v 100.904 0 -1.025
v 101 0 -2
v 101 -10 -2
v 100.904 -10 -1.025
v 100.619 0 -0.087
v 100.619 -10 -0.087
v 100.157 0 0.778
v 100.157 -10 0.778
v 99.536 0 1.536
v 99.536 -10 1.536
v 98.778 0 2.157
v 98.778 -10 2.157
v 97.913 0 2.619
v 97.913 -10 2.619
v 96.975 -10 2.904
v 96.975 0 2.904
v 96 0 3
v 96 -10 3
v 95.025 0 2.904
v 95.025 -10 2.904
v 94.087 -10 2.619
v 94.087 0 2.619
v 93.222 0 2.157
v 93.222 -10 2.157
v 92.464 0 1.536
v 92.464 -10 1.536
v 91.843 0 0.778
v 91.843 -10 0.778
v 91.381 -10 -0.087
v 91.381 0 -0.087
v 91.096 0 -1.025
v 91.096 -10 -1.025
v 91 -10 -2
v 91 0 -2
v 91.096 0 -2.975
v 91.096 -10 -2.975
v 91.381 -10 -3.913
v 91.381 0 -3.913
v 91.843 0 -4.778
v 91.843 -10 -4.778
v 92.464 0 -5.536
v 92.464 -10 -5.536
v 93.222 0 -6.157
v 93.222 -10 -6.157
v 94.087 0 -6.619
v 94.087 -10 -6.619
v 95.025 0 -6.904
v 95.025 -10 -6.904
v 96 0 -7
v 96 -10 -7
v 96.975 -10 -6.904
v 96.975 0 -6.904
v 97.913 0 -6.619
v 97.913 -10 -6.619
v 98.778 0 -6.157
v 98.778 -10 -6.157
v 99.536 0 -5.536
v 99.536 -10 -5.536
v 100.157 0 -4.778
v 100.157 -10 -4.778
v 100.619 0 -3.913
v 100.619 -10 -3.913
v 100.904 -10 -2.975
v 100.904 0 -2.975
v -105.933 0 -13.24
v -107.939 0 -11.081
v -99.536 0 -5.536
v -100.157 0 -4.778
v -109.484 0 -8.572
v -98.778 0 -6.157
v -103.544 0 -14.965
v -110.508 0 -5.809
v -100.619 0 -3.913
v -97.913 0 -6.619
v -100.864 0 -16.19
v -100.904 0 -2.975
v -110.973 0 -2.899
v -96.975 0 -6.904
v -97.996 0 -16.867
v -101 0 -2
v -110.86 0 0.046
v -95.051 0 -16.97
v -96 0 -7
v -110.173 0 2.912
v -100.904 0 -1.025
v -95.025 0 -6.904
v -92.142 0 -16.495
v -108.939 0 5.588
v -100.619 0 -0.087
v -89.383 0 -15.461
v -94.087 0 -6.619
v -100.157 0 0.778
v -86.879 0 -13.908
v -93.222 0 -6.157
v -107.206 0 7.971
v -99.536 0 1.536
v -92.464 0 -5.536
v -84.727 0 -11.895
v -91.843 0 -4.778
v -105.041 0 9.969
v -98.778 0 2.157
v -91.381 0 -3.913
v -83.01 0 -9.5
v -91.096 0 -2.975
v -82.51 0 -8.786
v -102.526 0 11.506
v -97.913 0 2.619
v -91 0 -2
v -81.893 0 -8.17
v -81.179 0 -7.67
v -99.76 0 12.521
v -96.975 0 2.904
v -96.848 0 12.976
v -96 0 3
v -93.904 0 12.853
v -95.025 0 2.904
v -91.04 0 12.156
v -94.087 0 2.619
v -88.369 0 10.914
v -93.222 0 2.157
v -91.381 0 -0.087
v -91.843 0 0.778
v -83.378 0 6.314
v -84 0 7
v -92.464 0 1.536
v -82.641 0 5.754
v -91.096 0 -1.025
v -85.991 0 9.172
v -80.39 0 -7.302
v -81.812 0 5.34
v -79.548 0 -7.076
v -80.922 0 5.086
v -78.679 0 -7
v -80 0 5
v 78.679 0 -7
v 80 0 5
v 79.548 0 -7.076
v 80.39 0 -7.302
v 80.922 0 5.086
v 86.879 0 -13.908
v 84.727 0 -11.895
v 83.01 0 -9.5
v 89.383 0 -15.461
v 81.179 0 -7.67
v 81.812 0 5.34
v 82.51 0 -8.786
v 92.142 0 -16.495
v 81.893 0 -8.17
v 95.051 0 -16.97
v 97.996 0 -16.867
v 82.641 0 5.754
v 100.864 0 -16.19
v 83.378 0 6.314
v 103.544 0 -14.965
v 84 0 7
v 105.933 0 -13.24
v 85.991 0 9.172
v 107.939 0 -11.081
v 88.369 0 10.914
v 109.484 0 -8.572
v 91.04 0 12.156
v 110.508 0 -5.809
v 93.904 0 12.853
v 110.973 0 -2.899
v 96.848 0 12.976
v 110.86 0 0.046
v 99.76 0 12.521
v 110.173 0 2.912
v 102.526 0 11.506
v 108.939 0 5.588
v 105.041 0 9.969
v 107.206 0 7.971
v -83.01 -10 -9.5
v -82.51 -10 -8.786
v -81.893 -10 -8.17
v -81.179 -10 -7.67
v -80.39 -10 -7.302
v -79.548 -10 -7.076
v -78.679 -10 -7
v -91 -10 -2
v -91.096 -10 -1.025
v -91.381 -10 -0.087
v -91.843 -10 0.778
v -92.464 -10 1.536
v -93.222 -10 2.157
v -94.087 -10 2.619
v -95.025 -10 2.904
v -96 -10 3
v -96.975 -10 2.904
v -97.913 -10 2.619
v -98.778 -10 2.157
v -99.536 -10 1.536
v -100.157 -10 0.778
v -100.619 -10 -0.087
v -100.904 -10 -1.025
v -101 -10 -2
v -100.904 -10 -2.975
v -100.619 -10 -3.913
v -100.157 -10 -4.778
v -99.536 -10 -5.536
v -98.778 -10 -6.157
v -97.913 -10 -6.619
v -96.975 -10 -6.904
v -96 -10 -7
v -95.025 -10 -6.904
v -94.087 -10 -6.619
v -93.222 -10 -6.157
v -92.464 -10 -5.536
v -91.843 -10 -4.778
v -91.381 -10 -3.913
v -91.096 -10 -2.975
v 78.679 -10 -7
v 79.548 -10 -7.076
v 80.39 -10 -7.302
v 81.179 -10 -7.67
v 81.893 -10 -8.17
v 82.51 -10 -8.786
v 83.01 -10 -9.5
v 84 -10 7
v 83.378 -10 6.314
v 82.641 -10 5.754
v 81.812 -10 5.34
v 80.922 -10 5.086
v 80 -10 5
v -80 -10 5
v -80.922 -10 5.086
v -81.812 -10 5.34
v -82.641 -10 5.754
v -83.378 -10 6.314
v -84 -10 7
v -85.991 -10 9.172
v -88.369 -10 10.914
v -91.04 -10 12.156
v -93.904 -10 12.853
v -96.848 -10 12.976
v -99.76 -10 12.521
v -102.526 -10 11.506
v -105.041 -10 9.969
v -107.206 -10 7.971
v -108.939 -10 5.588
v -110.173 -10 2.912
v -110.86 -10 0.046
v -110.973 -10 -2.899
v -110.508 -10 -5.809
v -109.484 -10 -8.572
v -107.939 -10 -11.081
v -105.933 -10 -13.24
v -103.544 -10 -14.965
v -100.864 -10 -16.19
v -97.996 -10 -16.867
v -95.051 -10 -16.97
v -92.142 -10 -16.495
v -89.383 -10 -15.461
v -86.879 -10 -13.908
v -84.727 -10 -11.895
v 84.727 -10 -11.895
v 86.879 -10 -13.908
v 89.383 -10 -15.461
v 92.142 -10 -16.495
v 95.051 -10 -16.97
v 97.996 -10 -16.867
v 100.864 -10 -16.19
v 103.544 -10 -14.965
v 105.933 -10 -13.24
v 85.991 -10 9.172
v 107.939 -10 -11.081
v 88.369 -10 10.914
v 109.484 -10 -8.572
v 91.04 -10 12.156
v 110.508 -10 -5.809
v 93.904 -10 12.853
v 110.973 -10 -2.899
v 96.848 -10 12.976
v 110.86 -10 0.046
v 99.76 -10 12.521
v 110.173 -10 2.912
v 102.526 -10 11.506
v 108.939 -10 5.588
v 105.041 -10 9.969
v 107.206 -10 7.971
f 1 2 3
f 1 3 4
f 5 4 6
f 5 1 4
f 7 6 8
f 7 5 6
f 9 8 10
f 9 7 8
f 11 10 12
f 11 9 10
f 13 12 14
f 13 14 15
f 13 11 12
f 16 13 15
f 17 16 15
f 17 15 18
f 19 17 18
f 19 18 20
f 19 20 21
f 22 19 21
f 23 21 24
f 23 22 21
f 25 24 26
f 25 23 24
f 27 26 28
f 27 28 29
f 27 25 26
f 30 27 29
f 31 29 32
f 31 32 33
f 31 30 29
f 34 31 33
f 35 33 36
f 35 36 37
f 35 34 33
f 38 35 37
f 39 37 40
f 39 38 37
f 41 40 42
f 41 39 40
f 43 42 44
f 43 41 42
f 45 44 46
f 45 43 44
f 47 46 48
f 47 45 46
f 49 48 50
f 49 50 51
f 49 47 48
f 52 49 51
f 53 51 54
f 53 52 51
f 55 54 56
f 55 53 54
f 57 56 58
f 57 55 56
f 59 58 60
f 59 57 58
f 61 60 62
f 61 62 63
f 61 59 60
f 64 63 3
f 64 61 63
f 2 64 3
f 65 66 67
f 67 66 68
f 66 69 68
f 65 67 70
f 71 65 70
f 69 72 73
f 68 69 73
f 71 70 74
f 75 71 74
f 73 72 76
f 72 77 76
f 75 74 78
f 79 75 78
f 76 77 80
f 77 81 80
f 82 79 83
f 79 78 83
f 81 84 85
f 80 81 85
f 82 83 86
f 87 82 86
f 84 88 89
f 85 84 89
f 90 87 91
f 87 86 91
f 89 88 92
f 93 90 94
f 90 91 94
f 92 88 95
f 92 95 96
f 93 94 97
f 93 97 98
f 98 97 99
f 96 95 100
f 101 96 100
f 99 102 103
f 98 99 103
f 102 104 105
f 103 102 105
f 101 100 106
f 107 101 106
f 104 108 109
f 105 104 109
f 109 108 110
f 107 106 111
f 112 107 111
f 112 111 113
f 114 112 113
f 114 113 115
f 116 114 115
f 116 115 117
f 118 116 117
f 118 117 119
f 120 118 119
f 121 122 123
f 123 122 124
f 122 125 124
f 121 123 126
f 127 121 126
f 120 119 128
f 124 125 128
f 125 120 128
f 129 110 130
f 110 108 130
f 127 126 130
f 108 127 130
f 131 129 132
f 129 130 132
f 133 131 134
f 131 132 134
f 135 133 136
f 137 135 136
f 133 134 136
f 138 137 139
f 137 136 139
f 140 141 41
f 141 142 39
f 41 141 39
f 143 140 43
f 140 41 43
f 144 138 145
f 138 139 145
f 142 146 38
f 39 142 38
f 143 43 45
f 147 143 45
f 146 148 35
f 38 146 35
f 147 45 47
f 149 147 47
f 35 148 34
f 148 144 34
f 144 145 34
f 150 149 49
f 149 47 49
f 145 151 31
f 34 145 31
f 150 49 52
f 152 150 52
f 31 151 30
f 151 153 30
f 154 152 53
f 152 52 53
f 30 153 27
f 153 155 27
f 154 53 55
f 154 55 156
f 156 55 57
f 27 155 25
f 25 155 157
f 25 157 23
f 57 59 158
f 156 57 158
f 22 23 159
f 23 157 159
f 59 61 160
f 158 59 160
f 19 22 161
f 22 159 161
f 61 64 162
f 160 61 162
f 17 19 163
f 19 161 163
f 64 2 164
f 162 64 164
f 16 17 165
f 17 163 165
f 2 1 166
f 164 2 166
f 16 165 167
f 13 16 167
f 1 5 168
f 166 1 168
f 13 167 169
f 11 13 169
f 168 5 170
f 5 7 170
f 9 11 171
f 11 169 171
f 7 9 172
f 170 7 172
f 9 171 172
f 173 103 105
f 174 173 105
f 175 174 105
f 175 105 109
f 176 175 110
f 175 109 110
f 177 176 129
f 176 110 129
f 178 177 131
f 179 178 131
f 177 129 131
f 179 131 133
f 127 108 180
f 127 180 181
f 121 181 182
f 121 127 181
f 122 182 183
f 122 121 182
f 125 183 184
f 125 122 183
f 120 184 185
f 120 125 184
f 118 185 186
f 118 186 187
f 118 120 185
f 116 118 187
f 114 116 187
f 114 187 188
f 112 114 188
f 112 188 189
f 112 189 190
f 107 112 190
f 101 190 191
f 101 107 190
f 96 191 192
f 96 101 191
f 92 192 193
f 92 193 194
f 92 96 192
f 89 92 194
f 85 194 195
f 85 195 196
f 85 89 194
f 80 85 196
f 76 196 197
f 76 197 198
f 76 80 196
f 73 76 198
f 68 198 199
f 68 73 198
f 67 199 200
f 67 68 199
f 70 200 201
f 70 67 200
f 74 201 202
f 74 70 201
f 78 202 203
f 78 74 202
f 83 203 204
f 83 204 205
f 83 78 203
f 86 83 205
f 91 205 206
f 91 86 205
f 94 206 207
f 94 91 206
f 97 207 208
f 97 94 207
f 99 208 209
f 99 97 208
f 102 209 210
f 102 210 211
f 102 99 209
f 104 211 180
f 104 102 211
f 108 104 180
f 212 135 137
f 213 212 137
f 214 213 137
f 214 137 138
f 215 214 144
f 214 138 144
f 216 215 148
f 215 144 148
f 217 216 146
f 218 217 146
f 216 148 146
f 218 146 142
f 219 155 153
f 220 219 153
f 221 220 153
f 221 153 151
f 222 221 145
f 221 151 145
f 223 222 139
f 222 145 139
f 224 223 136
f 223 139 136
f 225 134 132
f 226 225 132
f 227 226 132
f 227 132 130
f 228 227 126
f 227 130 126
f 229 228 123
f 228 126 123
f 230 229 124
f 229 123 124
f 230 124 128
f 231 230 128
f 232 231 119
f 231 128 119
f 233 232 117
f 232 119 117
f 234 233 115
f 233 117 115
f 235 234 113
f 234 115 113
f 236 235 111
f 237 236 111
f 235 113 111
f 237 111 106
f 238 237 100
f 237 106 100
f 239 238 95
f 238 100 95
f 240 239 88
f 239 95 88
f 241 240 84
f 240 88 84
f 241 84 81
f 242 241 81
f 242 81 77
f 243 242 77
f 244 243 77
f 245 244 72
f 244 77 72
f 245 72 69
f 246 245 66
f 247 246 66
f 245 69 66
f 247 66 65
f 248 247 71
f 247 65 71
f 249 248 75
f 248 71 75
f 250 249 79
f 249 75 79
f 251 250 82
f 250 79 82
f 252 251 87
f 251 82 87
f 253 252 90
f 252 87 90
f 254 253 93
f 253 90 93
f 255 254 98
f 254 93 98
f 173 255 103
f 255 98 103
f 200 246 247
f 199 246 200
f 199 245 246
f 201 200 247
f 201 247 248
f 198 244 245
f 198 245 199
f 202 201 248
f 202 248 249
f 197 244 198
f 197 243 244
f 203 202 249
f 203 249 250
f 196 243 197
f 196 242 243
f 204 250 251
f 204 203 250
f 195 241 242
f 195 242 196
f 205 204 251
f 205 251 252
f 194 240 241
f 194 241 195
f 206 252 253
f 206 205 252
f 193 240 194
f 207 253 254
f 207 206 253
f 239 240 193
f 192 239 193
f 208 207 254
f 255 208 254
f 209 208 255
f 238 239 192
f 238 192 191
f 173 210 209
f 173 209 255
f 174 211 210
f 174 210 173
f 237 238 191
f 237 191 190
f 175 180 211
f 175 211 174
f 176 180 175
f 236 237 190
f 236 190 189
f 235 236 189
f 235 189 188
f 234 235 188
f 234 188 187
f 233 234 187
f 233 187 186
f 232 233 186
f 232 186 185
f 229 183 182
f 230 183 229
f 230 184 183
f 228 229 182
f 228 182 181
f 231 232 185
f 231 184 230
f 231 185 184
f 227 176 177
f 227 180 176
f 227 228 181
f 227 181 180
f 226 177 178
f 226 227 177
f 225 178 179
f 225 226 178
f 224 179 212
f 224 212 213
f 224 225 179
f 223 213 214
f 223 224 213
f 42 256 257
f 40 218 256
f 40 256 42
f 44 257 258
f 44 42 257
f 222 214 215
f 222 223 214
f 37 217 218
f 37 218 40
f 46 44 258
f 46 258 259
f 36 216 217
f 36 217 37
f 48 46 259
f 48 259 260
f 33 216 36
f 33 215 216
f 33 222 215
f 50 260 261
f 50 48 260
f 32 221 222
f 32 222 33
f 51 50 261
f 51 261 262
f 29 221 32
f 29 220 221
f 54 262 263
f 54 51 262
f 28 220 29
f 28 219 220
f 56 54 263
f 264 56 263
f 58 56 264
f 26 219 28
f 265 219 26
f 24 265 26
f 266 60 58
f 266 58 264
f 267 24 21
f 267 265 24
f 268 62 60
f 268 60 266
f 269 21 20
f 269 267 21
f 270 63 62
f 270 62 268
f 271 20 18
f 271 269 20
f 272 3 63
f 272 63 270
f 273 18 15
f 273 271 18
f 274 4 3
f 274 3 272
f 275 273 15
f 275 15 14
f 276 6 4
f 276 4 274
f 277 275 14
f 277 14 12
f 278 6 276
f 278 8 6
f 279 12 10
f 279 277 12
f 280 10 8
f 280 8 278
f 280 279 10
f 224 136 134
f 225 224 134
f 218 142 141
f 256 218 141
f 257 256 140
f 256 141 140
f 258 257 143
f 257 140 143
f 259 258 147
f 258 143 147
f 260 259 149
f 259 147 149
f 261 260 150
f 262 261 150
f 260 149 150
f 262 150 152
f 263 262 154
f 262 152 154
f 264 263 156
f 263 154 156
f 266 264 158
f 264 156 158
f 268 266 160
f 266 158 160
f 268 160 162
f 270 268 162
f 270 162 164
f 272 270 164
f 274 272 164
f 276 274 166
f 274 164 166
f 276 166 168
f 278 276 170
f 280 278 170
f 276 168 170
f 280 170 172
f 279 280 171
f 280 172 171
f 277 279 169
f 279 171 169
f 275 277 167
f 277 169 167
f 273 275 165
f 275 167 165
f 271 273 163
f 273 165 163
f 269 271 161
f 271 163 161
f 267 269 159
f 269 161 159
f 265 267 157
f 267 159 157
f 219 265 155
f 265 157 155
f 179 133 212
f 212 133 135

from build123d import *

# Parameters (mm, degrees)
F0_R     = 5
F1_DEPTH = 10


with BuildPart() as f1:
    # F0 (on Front) → F1 (new body)
    with BuildSketch(Plane.XZ):
        with BuildLine():
            ThreePointArc((-83.009619, -9.5), (-81.179492, -7.669873), (-78.679492, -7))
            Line((-78.679492, -7), (0, -7))
            Line((0, -7), (78.679492, -7))
            ThreePointArc((78.679492, -7), (81.179492, -7.669873), (83.009619, -9.5))
            ThreePointArc((83.009619, -9.5), (110.973052, -2.898729), (84, 7))
            ThreePointArc((84, 7), (82.236068, 5.527864), (80, 5))
            Line((80, 5), (0, 5))
            Line((0, 5), (-80, 5))
            ThreePointArc((-80, 5), (-82.236068, 5.527864), (-84, 7))
            ThreePointArc((-84, 7), (-110.973052, -2.898729), (-83.009619, -9.5))
        make_face()
        with Locations((-96, -2)):
            Circle(F0_R, mode=Mode.SUBTRACT)
        with Locations((96, -2)):
            Circle(F0_R, mode=Mode.SUBTRACT)
    extrude(amount=F1_DEPTH)


solid = f1.part
